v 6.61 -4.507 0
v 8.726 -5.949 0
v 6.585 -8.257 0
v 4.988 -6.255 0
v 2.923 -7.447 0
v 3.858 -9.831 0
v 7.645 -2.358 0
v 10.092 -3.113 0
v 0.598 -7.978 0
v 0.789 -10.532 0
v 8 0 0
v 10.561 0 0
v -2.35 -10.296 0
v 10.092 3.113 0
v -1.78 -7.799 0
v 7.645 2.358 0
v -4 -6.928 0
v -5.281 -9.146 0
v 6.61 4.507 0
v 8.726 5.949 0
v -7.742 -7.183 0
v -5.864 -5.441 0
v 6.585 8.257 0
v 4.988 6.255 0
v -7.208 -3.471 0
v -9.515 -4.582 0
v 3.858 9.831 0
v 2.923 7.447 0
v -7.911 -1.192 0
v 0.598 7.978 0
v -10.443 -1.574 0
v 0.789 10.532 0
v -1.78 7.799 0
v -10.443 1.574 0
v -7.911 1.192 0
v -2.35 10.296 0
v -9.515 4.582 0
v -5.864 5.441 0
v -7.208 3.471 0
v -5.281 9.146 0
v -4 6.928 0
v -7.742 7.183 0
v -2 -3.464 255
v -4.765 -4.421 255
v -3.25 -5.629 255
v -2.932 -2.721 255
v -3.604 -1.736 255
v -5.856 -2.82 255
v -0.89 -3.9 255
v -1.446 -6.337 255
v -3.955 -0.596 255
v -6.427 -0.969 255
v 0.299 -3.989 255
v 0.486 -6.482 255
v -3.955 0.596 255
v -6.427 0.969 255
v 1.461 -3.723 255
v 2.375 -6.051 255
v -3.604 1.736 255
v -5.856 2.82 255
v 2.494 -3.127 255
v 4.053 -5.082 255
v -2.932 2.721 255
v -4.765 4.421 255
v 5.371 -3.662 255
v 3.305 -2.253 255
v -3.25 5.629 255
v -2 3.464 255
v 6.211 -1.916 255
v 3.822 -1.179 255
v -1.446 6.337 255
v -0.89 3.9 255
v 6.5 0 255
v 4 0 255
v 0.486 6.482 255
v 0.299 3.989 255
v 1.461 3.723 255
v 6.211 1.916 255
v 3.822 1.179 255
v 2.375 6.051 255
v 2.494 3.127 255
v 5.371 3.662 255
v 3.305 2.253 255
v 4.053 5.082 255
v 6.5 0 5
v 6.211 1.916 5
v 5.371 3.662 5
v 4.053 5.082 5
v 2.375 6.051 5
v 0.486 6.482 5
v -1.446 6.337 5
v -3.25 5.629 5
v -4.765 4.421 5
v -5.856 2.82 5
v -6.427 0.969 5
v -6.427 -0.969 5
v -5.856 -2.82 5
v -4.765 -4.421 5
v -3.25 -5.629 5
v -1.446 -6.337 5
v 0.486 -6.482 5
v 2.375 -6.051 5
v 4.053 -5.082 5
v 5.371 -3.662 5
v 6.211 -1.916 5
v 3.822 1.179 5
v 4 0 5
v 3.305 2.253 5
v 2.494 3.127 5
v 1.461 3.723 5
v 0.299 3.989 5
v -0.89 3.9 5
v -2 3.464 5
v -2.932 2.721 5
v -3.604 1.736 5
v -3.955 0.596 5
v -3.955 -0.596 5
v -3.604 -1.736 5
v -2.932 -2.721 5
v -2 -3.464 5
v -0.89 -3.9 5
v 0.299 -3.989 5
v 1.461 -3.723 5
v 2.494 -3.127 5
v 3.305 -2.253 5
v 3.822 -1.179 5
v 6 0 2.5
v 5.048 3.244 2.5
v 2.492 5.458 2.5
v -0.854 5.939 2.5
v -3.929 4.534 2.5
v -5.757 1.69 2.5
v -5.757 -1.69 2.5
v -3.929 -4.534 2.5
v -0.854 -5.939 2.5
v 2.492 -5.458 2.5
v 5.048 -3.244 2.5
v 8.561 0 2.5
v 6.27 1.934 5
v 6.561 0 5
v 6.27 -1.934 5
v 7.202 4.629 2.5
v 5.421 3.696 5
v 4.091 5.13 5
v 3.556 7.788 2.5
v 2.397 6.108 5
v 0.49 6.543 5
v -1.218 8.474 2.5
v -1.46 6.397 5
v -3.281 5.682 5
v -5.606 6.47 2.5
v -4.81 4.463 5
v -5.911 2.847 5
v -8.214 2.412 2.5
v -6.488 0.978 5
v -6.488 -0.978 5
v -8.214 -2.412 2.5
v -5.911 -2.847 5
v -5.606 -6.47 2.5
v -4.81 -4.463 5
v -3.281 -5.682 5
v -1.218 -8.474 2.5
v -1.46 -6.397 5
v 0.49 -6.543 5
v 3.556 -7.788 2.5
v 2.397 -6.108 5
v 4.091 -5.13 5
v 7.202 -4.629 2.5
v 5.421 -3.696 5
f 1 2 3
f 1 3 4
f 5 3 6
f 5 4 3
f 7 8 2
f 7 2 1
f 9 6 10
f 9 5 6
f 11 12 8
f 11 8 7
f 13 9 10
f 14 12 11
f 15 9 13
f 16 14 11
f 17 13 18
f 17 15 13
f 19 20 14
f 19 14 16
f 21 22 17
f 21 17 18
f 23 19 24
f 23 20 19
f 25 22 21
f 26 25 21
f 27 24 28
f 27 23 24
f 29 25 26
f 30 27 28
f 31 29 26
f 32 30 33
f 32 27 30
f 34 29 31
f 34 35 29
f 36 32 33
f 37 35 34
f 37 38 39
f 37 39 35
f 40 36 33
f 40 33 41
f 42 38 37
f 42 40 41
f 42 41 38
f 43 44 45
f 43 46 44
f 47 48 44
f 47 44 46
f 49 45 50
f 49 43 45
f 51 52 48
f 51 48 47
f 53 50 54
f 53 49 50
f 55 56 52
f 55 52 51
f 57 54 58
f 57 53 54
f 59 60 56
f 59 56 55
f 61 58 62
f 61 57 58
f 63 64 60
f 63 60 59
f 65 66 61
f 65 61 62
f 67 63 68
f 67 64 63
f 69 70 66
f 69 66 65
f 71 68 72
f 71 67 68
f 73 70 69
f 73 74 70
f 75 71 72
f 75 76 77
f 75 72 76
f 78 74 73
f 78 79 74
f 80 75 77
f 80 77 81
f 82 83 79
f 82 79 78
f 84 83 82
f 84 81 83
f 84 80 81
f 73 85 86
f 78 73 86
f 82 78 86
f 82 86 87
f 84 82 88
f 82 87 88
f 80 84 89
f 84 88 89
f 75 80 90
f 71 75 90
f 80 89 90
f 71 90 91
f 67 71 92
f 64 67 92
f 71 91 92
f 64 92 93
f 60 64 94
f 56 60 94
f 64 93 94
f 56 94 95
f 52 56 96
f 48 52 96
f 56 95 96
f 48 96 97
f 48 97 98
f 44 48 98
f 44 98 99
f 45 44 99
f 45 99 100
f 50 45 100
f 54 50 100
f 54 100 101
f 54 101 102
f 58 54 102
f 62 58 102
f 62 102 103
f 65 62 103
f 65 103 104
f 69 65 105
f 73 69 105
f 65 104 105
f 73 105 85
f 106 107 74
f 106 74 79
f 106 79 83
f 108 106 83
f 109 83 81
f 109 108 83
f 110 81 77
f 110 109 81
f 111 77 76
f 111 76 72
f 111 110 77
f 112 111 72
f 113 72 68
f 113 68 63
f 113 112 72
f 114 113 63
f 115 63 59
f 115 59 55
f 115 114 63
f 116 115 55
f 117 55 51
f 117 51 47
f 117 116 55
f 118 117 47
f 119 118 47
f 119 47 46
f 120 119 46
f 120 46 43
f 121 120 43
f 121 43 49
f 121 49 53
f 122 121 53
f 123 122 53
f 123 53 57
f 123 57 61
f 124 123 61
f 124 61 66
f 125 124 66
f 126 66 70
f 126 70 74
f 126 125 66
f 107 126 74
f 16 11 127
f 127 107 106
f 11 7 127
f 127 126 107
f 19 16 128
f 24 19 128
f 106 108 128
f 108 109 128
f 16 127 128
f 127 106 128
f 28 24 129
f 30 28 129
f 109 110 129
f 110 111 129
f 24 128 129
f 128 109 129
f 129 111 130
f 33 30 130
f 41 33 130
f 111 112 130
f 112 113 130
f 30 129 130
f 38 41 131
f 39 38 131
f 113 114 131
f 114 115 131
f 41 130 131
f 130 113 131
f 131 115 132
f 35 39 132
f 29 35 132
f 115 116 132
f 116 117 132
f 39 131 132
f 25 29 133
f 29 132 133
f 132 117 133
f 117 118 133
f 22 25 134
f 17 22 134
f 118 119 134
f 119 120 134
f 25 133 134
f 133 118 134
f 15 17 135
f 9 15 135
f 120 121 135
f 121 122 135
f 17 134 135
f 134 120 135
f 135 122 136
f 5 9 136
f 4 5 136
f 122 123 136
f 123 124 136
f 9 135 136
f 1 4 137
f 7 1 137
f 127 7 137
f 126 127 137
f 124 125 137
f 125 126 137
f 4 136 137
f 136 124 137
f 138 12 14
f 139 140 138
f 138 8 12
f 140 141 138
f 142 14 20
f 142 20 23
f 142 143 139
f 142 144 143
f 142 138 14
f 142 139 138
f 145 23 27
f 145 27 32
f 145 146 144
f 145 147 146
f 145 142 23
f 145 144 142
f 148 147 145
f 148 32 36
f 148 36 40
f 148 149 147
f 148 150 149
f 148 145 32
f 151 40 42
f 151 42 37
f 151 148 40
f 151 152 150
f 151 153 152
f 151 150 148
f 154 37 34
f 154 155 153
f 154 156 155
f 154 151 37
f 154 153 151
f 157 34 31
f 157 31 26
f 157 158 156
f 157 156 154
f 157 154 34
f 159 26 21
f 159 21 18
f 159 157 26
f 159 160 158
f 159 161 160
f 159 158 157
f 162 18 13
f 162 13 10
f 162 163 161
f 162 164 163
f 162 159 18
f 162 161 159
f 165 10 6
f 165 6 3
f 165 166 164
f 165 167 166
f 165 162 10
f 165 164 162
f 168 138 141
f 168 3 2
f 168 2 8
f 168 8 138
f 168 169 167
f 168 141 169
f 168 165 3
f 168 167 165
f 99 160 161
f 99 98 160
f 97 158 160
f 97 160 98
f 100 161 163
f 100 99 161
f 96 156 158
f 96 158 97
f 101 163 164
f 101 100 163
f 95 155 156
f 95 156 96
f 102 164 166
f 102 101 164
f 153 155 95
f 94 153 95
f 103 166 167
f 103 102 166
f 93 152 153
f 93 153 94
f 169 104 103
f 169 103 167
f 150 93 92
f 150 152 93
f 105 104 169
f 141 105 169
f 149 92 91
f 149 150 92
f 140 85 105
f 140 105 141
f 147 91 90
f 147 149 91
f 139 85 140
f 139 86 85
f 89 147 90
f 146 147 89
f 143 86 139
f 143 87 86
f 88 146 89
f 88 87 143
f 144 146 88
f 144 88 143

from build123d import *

# Parameters (mm, degrees)
THICKNESS_T   = 2
SKETCH001_R   = 6.5
SKETCH001_R_2 = 4
PAD_DEPTH     = 250


with BuildPart() as part:
    # Sketch → Revolution (revolve)
    with BuildSketch(Plane.XZ):
        Polygon((0, 0), (8, 0), (4, 5), (0, 5), align=None)
    revolve(axis=Axis((0, 0, 0), (0, 0, 1)))

    # Thickness
    thickness_openings = [part.faces().sort_by_distance(p)[0] for p in [
        (0, 0, 5),
        (0, 0, 0),
    ]]
    offset(amount=THICKNESS_T, openings=thickness_openings)

    # Sketch001 (on Face4 of Thickness) → Pad (new body)
    with BuildSketch(Plane.XY.offset(5)):
        Circle(SKETCH001_R)
        Circle(SKETCH001_R_2, mode=Mode.SUBTRACT)
    extrude(amount=PAD_DEPTH)


solid = part.part
